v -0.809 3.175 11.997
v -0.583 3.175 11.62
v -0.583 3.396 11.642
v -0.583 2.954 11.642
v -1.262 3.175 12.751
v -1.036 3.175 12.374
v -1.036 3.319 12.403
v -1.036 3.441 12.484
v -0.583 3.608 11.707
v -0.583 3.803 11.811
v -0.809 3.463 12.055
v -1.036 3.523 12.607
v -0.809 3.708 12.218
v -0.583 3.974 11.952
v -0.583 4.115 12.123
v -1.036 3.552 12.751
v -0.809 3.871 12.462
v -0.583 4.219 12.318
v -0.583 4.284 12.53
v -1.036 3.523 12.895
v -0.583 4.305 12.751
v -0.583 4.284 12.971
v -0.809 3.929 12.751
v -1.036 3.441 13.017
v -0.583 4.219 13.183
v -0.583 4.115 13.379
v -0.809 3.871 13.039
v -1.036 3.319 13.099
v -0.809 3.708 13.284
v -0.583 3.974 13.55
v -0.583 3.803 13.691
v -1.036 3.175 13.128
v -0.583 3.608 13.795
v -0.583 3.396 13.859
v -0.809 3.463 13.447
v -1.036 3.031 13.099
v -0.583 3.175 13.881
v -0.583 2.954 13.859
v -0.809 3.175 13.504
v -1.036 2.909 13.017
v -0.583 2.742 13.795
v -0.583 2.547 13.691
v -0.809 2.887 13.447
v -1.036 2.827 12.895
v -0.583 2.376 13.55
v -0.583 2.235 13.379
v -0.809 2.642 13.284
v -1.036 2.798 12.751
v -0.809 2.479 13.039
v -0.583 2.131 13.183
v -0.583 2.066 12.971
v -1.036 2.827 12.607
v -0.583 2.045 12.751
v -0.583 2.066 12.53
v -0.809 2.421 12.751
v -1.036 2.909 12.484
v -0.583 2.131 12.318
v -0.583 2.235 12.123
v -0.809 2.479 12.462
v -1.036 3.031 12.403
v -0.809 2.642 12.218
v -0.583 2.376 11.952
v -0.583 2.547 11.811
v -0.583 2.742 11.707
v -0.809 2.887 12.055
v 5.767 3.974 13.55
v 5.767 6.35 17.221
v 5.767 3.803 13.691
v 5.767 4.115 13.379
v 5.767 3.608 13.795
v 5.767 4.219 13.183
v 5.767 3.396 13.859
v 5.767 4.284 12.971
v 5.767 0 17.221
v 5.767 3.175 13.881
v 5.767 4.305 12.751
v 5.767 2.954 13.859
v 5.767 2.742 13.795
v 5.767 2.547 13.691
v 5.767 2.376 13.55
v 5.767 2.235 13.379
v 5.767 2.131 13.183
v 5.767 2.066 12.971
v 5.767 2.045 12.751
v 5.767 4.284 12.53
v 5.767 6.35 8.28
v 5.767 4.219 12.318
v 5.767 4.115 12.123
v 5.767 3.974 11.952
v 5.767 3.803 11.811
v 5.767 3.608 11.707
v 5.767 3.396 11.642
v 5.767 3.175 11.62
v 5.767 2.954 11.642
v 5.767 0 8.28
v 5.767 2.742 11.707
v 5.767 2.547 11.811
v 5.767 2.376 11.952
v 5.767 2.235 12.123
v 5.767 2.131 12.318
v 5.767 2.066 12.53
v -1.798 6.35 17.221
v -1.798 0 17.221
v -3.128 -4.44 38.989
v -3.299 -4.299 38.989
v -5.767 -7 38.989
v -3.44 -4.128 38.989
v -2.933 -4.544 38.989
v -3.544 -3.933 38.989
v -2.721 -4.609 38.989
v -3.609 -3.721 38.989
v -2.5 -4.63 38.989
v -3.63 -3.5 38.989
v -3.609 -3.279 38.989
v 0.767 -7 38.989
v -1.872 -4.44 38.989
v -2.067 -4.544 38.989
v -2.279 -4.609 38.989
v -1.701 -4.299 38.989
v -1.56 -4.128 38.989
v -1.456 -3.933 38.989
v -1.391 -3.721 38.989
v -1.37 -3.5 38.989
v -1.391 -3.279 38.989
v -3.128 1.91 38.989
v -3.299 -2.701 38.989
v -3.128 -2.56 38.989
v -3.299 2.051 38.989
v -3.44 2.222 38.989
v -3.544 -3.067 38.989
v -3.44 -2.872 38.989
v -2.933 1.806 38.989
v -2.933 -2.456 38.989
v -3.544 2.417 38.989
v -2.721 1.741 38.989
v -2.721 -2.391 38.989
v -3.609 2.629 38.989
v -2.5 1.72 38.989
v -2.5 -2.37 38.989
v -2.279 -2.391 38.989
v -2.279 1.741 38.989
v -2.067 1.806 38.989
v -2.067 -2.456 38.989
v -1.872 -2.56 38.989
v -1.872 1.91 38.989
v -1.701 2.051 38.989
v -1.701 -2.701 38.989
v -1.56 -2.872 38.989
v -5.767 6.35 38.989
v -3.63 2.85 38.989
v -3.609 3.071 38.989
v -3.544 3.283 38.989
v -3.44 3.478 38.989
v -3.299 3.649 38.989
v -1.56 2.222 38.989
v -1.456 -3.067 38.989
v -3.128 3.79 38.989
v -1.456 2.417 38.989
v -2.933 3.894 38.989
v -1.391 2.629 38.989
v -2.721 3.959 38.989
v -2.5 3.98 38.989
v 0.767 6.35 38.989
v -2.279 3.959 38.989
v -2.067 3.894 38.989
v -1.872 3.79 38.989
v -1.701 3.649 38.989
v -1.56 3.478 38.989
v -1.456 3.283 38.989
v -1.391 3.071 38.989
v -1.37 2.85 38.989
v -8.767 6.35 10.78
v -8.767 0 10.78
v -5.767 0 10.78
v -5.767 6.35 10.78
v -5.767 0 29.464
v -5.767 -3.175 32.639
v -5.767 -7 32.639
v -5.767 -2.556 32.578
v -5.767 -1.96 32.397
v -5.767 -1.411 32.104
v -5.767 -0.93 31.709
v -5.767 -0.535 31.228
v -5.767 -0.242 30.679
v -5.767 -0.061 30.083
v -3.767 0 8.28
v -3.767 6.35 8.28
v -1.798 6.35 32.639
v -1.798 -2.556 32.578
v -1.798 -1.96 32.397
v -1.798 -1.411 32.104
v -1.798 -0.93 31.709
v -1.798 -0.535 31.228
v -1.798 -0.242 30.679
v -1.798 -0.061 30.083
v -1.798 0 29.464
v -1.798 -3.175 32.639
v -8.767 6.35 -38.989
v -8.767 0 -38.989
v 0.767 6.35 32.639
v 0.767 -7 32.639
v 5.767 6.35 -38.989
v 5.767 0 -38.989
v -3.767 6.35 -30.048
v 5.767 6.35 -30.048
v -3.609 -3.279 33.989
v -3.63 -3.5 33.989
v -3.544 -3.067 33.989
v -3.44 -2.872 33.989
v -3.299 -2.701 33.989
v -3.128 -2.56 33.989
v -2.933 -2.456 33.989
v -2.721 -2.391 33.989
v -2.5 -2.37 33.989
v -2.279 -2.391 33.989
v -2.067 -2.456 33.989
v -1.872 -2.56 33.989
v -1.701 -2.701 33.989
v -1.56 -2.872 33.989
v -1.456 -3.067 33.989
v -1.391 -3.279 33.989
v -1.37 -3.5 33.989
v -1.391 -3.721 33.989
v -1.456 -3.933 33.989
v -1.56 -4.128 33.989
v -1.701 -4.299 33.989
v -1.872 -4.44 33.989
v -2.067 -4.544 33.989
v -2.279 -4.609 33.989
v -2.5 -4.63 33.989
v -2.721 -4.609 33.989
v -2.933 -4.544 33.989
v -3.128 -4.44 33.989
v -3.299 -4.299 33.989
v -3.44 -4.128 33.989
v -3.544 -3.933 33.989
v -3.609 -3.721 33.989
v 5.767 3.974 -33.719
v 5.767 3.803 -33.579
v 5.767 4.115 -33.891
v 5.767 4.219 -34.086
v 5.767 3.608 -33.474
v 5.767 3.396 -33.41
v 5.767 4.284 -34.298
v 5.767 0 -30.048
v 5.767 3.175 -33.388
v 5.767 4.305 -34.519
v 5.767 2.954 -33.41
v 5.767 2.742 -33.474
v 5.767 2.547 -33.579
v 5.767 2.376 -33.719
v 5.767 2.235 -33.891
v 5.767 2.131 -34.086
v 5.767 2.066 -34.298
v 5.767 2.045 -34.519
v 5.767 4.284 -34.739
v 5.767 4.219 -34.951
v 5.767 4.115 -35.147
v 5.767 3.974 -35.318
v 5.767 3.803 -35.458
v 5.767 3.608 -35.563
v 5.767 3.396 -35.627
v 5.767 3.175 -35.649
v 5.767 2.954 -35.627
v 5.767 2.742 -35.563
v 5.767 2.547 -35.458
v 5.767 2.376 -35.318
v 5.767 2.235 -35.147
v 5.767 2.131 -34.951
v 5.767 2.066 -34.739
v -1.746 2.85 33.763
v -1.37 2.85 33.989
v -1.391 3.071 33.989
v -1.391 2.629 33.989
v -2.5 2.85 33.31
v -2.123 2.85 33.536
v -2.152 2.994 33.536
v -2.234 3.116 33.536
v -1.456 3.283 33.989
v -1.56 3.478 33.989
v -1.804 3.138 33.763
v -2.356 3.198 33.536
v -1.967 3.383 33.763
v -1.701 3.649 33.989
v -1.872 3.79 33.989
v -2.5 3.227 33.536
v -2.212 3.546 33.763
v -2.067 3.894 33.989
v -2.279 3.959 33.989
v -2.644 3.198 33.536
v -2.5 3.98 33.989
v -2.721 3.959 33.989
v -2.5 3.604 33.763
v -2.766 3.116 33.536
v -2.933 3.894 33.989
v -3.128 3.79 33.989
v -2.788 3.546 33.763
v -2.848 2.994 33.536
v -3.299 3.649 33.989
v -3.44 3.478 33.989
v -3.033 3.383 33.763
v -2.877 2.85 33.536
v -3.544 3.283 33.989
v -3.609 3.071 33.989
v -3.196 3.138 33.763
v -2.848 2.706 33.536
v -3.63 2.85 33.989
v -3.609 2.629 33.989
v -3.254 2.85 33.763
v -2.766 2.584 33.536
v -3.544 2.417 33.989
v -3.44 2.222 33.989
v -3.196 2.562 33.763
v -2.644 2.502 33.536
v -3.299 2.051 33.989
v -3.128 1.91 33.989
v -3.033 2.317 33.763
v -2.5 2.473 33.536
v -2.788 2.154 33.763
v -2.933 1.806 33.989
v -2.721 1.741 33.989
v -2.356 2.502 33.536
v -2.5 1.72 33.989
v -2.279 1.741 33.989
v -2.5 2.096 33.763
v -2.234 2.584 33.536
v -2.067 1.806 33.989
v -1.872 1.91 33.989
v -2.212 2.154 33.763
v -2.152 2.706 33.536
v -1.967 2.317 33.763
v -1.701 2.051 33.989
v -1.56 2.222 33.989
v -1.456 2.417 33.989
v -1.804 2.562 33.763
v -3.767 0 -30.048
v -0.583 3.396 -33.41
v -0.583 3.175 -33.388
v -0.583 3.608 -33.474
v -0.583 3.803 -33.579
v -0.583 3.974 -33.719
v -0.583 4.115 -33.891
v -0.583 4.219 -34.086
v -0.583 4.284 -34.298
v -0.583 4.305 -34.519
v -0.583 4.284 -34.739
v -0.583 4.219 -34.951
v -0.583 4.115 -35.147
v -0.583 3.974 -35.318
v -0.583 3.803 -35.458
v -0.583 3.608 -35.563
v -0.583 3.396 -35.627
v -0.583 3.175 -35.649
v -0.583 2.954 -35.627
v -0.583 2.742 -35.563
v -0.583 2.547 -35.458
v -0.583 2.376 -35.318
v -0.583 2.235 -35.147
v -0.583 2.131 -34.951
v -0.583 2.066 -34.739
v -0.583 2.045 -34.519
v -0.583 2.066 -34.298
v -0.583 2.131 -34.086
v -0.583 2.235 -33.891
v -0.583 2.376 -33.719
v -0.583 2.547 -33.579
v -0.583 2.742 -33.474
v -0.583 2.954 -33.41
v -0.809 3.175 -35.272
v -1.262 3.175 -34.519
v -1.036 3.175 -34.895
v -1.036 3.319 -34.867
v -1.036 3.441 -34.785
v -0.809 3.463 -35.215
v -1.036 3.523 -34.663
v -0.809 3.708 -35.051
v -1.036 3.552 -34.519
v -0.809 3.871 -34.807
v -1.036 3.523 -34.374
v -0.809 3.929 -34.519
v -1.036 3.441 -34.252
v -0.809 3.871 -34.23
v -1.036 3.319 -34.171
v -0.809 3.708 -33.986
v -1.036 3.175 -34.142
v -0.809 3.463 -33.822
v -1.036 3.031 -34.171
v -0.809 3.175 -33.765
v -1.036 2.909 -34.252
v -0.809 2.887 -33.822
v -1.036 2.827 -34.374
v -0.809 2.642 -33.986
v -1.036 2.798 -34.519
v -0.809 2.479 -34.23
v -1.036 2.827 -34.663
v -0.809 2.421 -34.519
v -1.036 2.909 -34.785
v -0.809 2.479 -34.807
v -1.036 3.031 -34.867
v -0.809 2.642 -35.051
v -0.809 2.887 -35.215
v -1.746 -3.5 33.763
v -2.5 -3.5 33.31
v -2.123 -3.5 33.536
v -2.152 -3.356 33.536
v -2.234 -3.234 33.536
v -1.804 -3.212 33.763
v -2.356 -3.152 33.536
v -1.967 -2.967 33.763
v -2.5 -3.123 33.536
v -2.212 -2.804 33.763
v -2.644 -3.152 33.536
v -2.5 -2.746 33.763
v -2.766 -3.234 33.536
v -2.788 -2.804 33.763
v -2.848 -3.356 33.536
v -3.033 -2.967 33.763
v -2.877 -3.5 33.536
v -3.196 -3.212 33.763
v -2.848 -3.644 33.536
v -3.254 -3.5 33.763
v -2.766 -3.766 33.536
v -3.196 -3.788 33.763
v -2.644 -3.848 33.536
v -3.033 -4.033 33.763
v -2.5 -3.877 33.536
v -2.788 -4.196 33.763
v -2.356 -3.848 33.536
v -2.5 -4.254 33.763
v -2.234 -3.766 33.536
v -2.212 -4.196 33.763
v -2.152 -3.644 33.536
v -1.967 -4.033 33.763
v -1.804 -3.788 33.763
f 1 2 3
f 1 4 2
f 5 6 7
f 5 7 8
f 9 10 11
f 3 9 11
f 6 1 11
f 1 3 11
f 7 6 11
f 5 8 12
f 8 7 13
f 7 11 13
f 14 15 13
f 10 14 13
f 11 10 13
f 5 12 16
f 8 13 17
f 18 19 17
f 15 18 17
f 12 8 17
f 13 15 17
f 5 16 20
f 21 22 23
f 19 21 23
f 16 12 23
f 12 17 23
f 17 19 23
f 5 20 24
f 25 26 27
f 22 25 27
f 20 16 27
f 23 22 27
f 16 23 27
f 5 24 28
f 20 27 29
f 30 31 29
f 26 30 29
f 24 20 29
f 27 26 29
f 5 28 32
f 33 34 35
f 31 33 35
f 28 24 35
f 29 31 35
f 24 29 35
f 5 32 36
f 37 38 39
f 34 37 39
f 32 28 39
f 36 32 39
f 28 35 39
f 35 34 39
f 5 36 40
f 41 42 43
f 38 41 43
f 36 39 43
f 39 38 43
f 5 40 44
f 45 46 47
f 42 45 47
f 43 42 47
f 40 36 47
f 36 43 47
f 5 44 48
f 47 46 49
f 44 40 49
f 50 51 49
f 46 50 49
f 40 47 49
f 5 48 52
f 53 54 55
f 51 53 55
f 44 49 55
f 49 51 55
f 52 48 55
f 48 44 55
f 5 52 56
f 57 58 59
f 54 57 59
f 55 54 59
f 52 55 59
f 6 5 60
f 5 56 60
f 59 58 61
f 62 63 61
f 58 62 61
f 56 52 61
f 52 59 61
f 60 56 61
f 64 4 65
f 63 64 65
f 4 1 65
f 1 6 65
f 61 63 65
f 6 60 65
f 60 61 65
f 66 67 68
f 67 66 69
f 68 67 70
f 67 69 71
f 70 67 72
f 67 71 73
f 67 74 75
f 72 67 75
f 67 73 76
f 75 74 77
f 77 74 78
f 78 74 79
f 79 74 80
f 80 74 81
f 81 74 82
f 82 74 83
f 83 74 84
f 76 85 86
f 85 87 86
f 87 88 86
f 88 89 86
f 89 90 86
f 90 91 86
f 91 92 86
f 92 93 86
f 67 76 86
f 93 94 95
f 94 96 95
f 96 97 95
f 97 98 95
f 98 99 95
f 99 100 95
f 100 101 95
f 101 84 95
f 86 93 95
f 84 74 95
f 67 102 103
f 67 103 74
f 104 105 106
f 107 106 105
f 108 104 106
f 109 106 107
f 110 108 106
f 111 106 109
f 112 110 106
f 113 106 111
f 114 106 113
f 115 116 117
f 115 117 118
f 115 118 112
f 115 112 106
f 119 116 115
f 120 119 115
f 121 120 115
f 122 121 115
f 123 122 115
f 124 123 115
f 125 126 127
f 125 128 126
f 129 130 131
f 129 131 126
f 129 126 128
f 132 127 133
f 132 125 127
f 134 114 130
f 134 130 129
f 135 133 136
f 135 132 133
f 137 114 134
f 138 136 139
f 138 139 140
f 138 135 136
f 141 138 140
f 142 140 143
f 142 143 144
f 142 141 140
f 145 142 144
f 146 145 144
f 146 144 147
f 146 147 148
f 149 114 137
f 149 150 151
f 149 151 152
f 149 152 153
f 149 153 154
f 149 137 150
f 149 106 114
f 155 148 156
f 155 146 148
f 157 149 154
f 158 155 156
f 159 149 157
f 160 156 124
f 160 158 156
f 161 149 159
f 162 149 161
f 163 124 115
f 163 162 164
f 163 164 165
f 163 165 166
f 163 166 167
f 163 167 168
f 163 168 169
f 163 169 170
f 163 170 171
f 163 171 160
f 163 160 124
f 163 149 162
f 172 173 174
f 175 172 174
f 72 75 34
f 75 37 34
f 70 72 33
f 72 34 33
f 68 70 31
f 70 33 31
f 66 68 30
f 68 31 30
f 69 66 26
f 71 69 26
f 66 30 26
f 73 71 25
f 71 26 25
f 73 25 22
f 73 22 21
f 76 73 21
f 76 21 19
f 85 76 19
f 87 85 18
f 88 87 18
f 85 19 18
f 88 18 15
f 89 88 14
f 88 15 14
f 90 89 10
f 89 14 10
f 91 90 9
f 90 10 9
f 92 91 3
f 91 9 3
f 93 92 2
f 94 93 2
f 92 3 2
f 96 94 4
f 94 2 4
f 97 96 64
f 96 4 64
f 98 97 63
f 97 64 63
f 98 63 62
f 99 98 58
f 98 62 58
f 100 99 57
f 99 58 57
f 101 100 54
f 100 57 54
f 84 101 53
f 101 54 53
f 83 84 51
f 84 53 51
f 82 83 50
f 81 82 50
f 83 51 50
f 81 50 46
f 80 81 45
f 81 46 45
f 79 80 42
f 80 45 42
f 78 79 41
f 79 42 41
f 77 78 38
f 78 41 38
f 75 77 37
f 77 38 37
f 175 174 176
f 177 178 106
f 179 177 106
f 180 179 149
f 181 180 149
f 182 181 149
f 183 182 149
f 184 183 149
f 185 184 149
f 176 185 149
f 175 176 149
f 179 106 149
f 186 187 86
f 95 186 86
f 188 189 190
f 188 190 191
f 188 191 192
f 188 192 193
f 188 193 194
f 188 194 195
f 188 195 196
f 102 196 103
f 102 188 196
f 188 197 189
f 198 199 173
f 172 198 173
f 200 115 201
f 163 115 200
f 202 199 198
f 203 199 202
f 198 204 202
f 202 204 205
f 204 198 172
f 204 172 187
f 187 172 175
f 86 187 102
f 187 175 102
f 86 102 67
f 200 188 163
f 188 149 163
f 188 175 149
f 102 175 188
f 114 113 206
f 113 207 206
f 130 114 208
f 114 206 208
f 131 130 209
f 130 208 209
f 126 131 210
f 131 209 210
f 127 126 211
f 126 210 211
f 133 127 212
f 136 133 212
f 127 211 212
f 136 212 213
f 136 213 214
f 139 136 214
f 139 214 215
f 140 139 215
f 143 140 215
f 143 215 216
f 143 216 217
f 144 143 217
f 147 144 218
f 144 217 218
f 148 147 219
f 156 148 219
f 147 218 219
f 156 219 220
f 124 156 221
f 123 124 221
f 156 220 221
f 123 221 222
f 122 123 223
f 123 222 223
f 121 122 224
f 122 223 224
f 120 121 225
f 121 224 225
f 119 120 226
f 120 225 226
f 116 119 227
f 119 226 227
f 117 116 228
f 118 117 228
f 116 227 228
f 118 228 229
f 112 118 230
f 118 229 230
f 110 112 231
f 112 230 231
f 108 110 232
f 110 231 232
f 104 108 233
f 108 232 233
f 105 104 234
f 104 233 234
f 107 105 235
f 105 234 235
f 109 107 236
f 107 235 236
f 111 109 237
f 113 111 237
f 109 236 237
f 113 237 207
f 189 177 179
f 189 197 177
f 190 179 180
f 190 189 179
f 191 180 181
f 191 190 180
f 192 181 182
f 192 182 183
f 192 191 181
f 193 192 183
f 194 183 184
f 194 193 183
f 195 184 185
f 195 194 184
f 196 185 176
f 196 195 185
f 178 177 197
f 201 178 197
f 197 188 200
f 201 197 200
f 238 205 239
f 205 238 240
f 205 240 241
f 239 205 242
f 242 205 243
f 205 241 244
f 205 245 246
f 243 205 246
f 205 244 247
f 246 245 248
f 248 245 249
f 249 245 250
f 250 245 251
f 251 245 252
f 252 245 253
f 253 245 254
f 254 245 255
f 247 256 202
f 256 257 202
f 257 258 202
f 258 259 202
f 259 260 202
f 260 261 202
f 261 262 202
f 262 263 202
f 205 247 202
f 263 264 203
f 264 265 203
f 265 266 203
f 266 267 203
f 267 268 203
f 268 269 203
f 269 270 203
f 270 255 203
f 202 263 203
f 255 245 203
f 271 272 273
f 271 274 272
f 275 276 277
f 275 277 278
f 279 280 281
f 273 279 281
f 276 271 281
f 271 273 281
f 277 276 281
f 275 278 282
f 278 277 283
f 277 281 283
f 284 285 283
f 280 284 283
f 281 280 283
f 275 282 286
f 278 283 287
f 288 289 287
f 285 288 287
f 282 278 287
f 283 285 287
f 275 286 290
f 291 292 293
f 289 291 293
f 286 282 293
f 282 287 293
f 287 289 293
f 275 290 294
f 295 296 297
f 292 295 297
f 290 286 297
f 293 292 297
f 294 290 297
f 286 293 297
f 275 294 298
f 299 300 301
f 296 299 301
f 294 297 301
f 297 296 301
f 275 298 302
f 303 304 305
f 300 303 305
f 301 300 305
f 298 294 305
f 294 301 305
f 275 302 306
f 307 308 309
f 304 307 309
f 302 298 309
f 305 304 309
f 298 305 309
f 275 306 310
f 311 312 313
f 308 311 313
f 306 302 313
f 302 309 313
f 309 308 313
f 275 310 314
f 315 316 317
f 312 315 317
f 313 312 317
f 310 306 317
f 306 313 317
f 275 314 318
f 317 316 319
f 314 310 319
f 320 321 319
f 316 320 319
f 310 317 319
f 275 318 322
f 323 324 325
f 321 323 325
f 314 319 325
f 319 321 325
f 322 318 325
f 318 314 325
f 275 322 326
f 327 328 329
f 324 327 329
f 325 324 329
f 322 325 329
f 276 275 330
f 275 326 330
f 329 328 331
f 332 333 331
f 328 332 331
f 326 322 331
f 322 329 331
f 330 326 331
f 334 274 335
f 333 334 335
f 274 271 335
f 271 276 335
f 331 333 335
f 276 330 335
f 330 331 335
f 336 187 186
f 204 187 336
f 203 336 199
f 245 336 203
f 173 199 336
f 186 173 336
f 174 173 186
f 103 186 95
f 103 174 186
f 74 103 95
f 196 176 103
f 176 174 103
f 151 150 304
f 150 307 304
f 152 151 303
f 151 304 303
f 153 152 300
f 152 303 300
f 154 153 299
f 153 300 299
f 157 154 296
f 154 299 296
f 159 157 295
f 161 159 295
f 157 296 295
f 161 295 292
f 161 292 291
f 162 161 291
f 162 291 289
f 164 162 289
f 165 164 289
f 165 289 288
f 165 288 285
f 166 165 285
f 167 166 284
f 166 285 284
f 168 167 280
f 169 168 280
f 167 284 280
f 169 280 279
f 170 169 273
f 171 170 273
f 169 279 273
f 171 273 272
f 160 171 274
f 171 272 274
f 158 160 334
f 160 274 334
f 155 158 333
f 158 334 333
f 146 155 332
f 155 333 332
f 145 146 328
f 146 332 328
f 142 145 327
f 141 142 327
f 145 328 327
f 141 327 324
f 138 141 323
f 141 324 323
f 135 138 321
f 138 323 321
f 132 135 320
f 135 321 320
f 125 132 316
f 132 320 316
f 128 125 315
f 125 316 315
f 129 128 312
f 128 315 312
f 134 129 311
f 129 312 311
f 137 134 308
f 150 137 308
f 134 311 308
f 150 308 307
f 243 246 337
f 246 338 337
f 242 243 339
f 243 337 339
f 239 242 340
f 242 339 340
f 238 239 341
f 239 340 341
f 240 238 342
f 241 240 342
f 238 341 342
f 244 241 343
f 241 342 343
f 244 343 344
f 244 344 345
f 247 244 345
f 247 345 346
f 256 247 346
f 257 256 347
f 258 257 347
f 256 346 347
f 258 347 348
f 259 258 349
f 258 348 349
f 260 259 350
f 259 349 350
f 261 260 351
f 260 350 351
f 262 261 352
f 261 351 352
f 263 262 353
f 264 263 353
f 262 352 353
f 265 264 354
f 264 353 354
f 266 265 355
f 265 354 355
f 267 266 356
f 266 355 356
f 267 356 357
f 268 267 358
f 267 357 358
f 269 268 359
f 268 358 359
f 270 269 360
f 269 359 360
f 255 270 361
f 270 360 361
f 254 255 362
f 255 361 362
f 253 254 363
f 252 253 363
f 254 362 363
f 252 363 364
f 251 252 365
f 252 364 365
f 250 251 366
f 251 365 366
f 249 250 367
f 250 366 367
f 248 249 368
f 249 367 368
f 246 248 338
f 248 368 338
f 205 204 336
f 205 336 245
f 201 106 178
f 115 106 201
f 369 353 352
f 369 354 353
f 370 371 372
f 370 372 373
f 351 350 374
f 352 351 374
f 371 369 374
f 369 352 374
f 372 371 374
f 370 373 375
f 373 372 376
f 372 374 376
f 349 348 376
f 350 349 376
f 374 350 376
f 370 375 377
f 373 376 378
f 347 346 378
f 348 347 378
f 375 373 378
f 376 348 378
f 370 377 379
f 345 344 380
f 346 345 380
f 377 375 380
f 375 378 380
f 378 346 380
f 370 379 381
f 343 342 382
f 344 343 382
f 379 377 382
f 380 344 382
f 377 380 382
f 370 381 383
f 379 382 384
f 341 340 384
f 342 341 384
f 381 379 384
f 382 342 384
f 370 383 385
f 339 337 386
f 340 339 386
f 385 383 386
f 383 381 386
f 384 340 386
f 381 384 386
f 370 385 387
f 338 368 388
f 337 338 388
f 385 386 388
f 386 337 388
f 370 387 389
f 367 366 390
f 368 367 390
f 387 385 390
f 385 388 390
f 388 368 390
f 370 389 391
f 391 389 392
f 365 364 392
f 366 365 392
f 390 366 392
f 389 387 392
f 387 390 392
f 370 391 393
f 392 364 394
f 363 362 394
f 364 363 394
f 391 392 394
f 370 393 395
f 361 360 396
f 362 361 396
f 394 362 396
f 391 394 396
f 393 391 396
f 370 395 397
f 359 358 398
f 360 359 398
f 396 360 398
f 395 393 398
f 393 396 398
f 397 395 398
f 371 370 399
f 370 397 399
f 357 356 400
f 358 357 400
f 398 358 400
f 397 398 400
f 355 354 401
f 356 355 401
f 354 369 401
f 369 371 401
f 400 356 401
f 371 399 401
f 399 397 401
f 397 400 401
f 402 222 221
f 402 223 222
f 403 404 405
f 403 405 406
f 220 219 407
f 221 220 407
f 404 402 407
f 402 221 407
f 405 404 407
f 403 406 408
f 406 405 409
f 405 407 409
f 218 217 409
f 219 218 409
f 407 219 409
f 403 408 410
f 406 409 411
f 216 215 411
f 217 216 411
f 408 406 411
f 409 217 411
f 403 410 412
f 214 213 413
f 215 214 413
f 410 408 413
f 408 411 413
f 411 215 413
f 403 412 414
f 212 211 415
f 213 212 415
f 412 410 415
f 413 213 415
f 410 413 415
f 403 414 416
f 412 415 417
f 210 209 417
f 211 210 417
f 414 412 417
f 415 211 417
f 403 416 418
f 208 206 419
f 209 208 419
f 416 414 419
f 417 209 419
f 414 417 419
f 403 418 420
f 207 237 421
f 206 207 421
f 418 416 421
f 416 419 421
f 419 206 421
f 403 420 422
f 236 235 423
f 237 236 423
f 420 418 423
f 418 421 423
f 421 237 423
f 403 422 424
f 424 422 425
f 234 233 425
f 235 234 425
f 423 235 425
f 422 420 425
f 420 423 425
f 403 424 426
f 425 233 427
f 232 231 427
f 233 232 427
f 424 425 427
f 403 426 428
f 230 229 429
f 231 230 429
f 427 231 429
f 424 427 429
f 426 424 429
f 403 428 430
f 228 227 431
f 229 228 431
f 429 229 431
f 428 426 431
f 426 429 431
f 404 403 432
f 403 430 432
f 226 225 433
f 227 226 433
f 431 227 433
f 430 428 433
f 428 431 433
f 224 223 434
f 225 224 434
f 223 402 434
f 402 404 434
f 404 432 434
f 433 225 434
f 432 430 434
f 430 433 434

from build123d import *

# Parameters (mm, degrees)
SKETCH1_W                 = 11.5344
SKETCH1_H                 = 77.978
BOSS_EXTRUDE1_DEPTH       = 6.35
F_4_40_TAPPED_HOLE1_D     = 2.2606
F_4_40_TAPPED_HOLE1_DEPTH = 6.35
F_4_40_TAPPED_HOLE1_TIP   = 0.679152758
SKETCH2_W                 = 9.5344
SKETCH2_H                 = 38.3286
SKETCH2_W_2               = 7.56565
SKETCH2_H_2               = 15.4178
CUT_EXTRUDE1_DEPTH        = 40.921488159
SKETCH8_W                 = 5
SKETCH8_H                 = 6.35
CUT_EXTRUDE2_DEPTH        = 40.921488159
SKETCH9_W                 = 6.5344
SKETCH9_H                 = 7
BOSS_EXTRUDE2_DEPTH       = 6.35
F_4_40_TAPPED_HOLE2_D     = 2.2606
F_4_40_TAPPED_HOLE2_DEPTH = 5
F_4_40_TAPPED_HOLE2_TIP   = 0.679152758
SKETCH10_W                = 3
SKETCH10_H                = 49.7694
BOSS_EXTRUDE3_DEPTH       = 6.35
FILLET1_R                 = 3.175


with BuildPart() as part:
    # Sketch1 → Boss-Extrude1 (new body)
    with BuildSketch(Plane(origin=(0, 0, 0), x_dir=(1, 0, 0), z_dir=(0, 1, 0))):
        Rectangle(SKETCH1_W, SKETCH1_H)
    extrude(amount=BOSS_EXTRUDE1_DEPTH)

    # #4-40 Tapped Hole1
    with Locations(Plane(origin=(5.7672, 0, 0), x_dir=(0, 0, -1), z_dir=(1, 0, 0))):
        with Locations((34.5186, 3.175), (-12.7508, 3.175)):
            Hole(F_4_40_TAPPED_HOLE1_D / 2, depth=F_4_40_TAPPED_HOLE1_DEPTH)
            with Locations((0, 0, -(F_4_40_TAPPED_HOLE1_DEPTH + F_4_40_TAPPED_HOLE1_TIP / 2))):  # 118° drill point
                Cone(0, F_4_40_TAPPED_HOLE1_D / 2, F_4_40_TAPPED_HOLE1_TIP, mode=Mode.SUBTRACT)

    # Sketch2 → Cut-Extrude1 (cut, through all)
    with BuildSketch(Plane(origin=(0, 6.35, 0), x_dir=(1, 0, 0), z_dir=(0, 1, 0))):
        with Locations((1, 10.8839)):
            Rectangle(SKETCH2_W, SKETCH2_H)
        with Locations((1.984375, -24.9301)):
            Rectangle(SKETCH2_W_2, SKETCH2_H_2)
    extrude(amount=-CUT_EXTRUDE1_DEPTH, mode=Mode.SUBTRACT)

    # Sketch8 → Cut-Extrude2 (cut, through all)
    with BuildSketch(Plane(origin=(0, 6.35, 0), x_dir=(1, 0, 0), z_dir=(0, 1, 0))):
        with Locations((3.2672, -35.814)):
            Rectangle(SKETCH8_W, SKETCH8_H)
    extrude(amount=-CUT_EXTRUDE2_DEPTH, mode=Mode.SUBTRACT)

    # Sketch9 → Boss-Extrude2 (add)
    with BuildSketch(Plane.XY.offset(38.989)):
        with Locations((-2.5, -3.5)):
            Rectangle(SKETCH9_W, SKETCH9_H)
    extrude(amount=-BOSS_EXTRUDE2_DEPTH)

    # #4-40 Tapped Hole2
    with Locations(Plane.XY.offset(38.989)):
        with Locations((-2.5, 2.85), (-2.5, -3.5)):
            Hole(F_4_40_TAPPED_HOLE2_D / 2, depth=F_4_40_TAPPED_HOLE2_DEPTH)
            with Locations((0, 0, -(F_4_40_TAPPED_HOLE2_DEPTH + F_4_40_TAPPED_HOLE2_TIP / 2))):  # 118° drill point
                Cone(0, F_4_40_TAPPED_HOLE2_D / 2, F_4_40_TAPPED_HOLE2_TIP, mode=Mode.SUBTRACT)

    # Sketch10 → Boss-Extrude3 (add)
    with BuildSketch(Plane.XZ):
        with Locations((-7.2672, -14.1043)):
            Rectangle(SKETCH10_W, SKETCH10_H)
    extrude(amount=-BOSS_EXTRUDE3_DEPTH)

    # Fillet1
    fillet1_edges = [part.edges().sort_by_distance(p)[0] for p in [
        (-3.782825, 0, 32.639),
    ]]
    fillet(fillet1_edges, radius=FILLET1_R)


solid = part.part
